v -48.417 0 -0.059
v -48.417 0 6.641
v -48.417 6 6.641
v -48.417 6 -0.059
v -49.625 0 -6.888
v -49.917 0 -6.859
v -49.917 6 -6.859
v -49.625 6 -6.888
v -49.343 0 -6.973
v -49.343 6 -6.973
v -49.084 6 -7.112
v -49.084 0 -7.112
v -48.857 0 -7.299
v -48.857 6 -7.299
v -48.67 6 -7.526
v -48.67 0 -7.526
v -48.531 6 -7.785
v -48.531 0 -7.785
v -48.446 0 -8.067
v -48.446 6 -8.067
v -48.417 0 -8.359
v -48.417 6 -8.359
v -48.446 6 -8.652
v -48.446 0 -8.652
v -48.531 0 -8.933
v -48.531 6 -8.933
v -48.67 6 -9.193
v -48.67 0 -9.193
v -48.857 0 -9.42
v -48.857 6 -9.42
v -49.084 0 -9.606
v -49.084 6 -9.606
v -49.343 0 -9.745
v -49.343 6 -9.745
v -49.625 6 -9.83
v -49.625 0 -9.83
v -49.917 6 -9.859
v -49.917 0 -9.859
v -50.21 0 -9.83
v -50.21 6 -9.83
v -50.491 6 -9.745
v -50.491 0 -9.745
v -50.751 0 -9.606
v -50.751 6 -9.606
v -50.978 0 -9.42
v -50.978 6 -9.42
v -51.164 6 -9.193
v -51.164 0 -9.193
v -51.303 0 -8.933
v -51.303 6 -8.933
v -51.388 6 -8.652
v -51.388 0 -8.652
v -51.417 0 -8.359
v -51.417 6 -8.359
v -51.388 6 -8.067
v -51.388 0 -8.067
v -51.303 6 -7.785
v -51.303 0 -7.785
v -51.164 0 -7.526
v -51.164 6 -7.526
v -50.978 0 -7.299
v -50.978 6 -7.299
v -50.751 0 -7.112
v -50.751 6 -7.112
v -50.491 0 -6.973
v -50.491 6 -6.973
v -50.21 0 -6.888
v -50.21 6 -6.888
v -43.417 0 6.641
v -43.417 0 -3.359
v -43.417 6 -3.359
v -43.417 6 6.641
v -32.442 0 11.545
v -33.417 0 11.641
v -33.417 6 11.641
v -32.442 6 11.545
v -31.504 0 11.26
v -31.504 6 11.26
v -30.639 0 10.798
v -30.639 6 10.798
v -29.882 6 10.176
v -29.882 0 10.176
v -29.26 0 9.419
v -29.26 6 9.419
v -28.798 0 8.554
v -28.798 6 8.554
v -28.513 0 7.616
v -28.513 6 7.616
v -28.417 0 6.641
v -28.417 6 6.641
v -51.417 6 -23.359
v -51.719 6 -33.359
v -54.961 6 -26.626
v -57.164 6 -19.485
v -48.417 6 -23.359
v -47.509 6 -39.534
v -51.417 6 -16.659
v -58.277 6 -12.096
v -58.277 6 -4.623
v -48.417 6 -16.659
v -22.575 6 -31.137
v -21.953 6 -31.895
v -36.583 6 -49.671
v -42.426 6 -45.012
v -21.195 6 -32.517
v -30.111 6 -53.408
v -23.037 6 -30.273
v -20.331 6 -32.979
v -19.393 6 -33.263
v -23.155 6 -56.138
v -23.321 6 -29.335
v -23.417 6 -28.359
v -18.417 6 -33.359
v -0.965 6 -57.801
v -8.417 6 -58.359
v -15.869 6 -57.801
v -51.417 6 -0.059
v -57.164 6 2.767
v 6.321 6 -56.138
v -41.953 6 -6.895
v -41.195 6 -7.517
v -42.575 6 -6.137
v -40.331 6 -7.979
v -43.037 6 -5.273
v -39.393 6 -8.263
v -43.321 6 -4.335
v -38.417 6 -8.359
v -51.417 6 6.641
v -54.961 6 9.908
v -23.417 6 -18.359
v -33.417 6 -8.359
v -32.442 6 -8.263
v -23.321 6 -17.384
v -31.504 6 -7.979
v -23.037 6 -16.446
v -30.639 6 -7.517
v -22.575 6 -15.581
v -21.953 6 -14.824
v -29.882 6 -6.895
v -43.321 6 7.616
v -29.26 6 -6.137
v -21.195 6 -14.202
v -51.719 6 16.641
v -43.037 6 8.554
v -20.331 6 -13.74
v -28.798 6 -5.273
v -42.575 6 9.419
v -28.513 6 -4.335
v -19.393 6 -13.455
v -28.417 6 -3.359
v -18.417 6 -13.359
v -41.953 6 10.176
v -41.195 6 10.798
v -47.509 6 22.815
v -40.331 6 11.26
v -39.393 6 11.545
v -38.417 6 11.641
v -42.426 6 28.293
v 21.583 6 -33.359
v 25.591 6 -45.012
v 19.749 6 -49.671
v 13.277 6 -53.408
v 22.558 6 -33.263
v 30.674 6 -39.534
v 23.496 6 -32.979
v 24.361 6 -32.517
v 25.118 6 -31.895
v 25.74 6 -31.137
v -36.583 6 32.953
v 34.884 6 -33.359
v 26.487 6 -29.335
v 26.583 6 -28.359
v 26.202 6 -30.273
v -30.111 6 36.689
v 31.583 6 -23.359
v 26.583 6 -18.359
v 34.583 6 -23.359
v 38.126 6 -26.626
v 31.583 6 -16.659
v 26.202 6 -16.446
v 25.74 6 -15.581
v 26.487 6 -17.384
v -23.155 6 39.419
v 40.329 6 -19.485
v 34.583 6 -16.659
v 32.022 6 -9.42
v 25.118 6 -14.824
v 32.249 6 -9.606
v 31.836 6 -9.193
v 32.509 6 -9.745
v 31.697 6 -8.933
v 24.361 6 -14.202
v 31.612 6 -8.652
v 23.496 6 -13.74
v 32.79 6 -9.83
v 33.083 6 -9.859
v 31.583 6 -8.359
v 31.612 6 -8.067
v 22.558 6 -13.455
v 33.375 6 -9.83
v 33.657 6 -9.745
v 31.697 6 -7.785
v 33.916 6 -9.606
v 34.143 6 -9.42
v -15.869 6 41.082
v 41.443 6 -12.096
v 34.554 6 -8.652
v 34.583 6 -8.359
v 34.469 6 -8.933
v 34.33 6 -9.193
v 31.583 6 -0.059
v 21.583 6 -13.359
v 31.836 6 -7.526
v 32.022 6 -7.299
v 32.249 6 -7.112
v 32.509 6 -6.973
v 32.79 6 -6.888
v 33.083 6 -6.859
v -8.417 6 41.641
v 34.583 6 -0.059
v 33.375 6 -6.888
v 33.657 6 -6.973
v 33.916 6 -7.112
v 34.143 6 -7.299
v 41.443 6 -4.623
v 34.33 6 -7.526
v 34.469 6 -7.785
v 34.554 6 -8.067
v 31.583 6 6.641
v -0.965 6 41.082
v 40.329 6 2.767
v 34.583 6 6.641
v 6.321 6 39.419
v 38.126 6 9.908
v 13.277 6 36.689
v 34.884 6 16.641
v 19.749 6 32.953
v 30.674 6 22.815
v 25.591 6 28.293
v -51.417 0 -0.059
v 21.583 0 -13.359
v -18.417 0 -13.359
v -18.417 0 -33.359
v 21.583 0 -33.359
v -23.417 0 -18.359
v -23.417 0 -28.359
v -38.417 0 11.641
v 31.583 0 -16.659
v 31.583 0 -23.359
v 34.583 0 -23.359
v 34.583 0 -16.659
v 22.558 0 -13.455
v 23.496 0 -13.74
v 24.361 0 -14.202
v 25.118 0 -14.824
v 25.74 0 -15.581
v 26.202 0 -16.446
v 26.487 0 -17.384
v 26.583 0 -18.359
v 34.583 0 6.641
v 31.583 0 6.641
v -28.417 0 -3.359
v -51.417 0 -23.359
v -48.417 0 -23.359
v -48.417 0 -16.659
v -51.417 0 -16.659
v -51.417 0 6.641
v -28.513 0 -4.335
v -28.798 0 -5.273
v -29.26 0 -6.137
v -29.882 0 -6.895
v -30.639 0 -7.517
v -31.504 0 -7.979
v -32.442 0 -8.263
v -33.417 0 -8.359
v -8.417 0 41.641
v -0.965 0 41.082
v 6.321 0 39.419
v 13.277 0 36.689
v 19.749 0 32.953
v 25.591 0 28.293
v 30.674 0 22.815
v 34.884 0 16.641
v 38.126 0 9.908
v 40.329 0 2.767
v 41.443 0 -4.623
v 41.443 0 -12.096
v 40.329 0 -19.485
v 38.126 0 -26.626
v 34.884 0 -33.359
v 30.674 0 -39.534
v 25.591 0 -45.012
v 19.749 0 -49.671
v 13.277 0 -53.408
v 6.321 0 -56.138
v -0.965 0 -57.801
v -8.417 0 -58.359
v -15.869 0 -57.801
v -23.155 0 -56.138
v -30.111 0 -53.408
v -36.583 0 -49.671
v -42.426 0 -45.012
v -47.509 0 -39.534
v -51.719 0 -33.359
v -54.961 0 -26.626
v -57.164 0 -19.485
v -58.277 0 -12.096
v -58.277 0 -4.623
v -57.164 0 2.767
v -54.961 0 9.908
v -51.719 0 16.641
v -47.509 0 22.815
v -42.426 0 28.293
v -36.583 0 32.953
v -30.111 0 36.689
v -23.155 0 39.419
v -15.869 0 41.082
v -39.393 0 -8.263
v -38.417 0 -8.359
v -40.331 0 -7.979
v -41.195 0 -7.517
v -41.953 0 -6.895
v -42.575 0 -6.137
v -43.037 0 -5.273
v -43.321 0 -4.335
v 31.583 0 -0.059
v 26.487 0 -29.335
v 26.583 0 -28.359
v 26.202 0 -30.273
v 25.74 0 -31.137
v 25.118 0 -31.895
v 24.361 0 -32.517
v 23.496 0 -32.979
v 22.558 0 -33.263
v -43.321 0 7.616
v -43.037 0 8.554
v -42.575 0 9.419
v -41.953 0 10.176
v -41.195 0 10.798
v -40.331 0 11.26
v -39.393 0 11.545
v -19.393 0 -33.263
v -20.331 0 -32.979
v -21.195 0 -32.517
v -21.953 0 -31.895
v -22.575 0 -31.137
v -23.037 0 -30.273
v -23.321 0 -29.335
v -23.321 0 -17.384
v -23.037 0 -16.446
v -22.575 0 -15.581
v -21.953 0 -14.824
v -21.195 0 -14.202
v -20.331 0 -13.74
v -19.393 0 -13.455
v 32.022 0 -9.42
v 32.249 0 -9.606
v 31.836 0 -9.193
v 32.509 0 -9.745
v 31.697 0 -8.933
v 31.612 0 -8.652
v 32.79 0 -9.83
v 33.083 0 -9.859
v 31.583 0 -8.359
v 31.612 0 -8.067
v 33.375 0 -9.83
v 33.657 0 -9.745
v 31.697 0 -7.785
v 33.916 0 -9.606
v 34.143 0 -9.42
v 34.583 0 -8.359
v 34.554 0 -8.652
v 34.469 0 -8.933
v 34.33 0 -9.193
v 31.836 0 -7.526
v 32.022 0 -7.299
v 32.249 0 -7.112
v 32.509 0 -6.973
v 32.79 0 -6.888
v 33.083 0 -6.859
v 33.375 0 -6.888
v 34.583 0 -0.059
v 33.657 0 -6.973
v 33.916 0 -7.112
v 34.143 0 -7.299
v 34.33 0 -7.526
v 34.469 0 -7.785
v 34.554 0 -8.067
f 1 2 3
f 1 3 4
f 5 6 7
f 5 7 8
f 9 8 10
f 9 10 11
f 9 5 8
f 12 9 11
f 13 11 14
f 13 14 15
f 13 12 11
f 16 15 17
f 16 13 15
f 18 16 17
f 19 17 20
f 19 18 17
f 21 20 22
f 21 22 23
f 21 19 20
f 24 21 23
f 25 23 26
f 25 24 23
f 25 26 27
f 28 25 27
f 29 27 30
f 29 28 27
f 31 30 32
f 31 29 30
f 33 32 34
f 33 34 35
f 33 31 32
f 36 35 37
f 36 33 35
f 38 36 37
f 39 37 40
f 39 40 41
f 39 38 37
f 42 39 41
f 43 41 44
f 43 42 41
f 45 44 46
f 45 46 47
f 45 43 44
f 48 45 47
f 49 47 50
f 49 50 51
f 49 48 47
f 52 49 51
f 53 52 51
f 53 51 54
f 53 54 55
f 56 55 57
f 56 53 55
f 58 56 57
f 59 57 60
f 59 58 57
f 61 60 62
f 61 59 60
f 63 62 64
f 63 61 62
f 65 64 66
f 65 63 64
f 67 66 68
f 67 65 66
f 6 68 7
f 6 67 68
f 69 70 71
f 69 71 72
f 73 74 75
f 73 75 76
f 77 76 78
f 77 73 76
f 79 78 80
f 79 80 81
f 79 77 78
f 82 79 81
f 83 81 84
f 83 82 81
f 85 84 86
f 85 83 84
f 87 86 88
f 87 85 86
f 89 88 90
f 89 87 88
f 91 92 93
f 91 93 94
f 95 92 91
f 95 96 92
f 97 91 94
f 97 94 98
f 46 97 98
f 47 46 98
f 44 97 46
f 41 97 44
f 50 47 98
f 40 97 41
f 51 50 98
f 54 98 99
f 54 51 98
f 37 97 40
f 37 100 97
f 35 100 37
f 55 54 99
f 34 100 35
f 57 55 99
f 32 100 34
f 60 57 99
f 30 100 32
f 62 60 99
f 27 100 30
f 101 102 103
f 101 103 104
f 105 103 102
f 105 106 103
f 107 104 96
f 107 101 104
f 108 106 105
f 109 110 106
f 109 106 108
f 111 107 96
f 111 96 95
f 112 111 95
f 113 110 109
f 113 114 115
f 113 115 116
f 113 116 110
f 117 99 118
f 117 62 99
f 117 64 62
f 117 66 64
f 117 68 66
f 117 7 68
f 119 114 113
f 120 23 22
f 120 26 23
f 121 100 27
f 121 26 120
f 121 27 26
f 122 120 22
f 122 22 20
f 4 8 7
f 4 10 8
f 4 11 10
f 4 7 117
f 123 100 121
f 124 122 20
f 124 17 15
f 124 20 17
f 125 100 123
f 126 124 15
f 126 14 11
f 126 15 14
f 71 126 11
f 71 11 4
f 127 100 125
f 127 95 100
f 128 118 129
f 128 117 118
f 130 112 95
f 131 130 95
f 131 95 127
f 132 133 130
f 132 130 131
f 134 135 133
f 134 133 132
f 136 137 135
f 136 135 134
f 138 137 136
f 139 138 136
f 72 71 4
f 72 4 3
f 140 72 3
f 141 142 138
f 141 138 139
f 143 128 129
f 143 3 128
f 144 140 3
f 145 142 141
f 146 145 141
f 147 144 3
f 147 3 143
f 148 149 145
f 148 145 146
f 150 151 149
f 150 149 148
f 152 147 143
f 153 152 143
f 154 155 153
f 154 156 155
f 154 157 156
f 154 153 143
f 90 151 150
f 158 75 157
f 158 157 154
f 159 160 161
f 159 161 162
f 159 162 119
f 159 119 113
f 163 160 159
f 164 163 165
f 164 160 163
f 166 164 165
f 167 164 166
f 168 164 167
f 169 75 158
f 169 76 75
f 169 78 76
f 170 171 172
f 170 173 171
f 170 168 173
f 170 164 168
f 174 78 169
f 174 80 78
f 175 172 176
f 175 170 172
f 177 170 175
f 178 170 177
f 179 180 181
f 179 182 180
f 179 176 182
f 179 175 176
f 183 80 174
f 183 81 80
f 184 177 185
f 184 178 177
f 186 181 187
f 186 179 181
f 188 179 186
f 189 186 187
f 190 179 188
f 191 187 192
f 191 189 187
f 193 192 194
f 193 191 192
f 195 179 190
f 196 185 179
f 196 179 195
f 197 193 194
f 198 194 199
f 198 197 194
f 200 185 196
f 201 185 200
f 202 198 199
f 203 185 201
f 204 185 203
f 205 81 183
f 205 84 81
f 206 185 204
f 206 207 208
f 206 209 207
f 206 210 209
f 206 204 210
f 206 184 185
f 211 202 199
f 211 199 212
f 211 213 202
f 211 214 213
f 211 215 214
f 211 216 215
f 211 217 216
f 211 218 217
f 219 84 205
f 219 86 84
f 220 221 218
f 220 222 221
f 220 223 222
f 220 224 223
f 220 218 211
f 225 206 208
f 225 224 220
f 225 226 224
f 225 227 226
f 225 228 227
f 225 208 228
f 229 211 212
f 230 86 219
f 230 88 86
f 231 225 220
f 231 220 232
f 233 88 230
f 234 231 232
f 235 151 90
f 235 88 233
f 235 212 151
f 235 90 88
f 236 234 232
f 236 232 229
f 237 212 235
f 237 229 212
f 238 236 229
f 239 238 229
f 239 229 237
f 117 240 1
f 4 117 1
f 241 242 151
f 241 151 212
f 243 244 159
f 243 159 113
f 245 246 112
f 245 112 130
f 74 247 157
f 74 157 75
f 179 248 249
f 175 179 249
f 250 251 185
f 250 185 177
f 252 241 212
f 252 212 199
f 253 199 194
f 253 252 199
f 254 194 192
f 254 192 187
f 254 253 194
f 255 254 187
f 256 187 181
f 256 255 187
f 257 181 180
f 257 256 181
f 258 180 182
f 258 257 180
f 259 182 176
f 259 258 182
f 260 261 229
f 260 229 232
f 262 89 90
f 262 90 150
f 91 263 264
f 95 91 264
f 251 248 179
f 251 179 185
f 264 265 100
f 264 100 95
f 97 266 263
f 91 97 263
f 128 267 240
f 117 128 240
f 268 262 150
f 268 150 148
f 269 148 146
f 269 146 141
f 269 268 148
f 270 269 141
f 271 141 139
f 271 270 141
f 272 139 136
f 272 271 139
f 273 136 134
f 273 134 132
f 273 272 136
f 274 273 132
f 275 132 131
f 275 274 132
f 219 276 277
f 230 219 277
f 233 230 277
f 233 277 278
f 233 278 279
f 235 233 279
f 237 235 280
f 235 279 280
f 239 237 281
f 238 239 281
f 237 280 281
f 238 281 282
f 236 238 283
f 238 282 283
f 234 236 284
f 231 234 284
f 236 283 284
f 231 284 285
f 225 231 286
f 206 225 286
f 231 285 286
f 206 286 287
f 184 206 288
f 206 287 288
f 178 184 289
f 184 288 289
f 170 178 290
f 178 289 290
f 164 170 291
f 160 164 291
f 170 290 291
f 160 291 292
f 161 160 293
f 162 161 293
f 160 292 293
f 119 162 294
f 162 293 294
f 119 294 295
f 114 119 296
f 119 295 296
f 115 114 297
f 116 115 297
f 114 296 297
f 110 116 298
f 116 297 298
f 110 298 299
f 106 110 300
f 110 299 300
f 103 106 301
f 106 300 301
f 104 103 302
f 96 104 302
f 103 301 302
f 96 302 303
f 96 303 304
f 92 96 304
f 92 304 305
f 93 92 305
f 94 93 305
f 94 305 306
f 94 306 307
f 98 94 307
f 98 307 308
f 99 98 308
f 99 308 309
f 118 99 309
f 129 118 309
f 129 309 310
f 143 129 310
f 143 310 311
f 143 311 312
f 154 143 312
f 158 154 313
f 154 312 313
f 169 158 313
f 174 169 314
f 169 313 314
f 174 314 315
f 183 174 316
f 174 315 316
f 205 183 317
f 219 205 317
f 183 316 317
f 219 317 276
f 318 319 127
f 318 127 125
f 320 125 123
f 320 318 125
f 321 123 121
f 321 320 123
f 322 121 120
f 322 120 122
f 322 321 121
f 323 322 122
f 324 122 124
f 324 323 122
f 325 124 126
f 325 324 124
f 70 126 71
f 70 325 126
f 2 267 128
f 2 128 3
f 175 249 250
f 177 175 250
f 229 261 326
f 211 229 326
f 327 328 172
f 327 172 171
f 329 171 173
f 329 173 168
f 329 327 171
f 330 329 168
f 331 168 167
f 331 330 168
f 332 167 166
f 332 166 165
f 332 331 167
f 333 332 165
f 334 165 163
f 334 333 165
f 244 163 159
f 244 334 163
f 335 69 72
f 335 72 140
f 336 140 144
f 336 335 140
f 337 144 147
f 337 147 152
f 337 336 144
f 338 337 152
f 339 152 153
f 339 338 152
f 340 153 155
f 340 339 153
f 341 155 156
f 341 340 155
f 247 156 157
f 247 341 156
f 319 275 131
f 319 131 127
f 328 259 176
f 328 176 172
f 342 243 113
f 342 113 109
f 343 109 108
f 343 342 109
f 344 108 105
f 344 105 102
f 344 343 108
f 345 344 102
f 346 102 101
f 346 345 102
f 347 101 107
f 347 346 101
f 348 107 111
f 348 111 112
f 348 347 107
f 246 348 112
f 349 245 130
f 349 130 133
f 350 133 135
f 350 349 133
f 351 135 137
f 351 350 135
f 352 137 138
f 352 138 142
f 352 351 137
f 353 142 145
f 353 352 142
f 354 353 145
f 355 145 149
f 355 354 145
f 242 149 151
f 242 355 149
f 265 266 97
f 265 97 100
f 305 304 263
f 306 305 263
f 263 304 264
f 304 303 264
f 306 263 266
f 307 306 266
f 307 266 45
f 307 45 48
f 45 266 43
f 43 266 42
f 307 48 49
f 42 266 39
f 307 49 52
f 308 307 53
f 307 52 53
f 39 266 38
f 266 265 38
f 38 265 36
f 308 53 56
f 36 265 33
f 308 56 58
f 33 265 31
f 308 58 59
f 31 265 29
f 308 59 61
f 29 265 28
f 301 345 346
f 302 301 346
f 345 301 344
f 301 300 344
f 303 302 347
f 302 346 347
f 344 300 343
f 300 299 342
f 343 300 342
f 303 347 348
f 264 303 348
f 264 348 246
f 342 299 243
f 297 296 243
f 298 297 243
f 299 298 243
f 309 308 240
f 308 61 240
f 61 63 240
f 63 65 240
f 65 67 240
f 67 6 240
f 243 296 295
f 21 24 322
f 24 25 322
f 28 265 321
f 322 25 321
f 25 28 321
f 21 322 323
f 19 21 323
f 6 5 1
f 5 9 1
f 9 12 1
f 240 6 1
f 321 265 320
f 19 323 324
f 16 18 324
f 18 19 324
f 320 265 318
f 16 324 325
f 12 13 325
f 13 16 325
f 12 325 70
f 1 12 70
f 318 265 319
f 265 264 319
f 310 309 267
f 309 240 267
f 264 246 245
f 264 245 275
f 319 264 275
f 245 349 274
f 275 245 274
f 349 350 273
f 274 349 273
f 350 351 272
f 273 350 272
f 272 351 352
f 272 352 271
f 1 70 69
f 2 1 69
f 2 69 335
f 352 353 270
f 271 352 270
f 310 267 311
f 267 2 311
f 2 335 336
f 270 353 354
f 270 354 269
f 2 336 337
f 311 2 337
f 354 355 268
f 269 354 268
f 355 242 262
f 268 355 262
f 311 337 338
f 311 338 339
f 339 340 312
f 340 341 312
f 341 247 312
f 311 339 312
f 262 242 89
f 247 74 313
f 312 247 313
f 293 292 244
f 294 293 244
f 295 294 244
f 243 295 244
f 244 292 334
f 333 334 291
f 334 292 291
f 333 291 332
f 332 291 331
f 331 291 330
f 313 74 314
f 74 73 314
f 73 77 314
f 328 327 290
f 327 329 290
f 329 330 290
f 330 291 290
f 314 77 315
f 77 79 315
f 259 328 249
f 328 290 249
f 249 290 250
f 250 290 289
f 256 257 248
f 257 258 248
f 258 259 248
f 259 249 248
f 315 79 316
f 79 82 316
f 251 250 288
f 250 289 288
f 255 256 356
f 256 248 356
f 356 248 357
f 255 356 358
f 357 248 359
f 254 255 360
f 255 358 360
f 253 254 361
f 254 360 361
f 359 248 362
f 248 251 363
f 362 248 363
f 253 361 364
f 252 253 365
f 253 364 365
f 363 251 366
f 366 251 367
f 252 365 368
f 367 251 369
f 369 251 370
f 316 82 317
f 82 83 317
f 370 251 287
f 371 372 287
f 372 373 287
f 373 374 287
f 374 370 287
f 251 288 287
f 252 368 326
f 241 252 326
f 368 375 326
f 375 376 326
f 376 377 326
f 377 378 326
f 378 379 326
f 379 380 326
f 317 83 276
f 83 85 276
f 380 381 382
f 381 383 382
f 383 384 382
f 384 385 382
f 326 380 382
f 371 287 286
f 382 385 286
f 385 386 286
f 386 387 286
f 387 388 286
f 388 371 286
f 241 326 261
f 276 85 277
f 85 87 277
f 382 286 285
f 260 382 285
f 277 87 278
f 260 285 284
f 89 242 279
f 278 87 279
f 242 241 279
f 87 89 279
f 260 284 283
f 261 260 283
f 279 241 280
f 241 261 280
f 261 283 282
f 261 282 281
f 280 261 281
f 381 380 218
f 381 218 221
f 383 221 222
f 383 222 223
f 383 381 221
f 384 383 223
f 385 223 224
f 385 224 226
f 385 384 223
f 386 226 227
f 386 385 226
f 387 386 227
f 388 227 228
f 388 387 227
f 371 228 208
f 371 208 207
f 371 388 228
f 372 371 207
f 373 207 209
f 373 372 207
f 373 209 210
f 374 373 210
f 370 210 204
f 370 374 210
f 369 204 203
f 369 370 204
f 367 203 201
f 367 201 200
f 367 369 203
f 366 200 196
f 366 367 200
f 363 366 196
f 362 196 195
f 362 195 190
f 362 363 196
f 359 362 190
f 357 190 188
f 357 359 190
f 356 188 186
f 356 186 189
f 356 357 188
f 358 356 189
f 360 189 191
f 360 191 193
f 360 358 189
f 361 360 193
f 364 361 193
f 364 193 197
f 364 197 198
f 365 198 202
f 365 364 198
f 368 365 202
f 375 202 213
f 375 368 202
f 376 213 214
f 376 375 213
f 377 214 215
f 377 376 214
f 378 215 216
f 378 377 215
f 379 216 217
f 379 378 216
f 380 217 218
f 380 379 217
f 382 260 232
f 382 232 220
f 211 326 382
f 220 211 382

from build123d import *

# Parameters (mm, degrees)
SKETCH2_R           = 50
SKETCH2_R_2         = 1.5
SKETCH2_W           = 3
SKETCH2_H           = 6.7
BOSS_EXTRUDE2_DEPTH = 6


with BuildPart() as part:
    # Sketch2 → Boss-Extrude2 (new body)
    with BuildSketch(Plane(origin=(0, 0, 0), x_dir=(1, 0, 0), z_dir=(0, 1, 0))):
        with Locations(Location((-8.417247628, 8.35921329, 0), (0, 0, 270))):
            Circle(SKETCH2_R)
        with Locations(Location((33.082752372, 8.35921329, 0), (0, 0, 270))):
            Circle(SKETCH2_R_2, mode=Mode.SUBTRACT)
        with Locations(Location((-49.917247628, 8.35921329, 0), (0, 0, 270))):
            Circle(SKETCH2_R_2, mode=Mode.SUBTRACT)
        with Locations((-49.917247628, 20.00921329)):
            Rectangle(SKETCH2_W, SKETCH2_H, mode=Mode.SUBTRACT)
        with Locations((-49.917247628, -3.29078671)):
            Rectangle(SKETCH2_W, SKETCH2_H, mode=Mode.SUBTRACT)
        with Locations((33.082752372, 20.00921329)):
            Rectangle(SKETCH2_W, SKETCH2_H, mode=Mode.SUBTRACT)
        with Locations((33.082752372, -3.29078671)):
            Rectangle(SKETCH2_W, SKETCH2_H, mode=Mode.SUBTRACT)
        with BuildLine():
            Line((21.582752372, 33.35921329), (-18.417247628, 33.35921329))
            ThreePointArc((-18.417247628, 33.35921329), (-21.952781534, 31.894747196), (-23.417247628, 28.35921329))
            Line((-23.417247628, 28.35921329), (-23.417247628, 18.35921329))
            ThreePointArc((-23.417247628, 18.35921329), (-21.952781534, 14.823679384), (-18.417247628, 13.35921329))
            Line((-18.417247628, 13.35921329), (21.582752372, 13.35921329))
            ThreePointArc((21.582752372, 13.35921329), (25.118286278, 14.823679384), (26.582752372, 18.35921329))
            Line((26.582752372, 18.35921329), (26.582752372, 28.35921329))
            ThreePointArc((26.582752372, 28.35921329), (25.118286278, 31.894747196), (21.582752372, 33.35921329))
        make_face(mode=Mode.SUBTRACT)
        with BuildLine():
            Line((-33.417247628, 8.35921329), (-38.417247628, 8.35921329))
            ThreePointArc((-38.417247628, 8.35921329), (-41.952781534, 6.894747196), (-43.417247628, 3.35921329))
            Line((-43.417247628, 3.35921329), (-43.417247628, -6.64078671))
            ThreePointArc((-43.417247628, -6.64078671), (-41.952781534, -10.176320616), (-38.417247628, -11.64078671))
            Line((-38.417247628, -11.64078671), (-33.417247628, -11.64078671))
            ThreePointArc((-33.417247628, -11.64078671), (-29.881713722, -10.176320616), (-28.417247628, -6.64078671))
            Line((-28.417247628, -6.64078671), (-28.417247628, 3.35921329))
            ThreePointArc((-28.417247628, 3.35921329), (-29.881713722, 6.894747196), (-33.417247628, 8.35921329))
        make_face(mode=Mode.SUBTRACT)
    extrude(amount=BOSS_EXTRUDE2_DEPTH)


solid = part.part
